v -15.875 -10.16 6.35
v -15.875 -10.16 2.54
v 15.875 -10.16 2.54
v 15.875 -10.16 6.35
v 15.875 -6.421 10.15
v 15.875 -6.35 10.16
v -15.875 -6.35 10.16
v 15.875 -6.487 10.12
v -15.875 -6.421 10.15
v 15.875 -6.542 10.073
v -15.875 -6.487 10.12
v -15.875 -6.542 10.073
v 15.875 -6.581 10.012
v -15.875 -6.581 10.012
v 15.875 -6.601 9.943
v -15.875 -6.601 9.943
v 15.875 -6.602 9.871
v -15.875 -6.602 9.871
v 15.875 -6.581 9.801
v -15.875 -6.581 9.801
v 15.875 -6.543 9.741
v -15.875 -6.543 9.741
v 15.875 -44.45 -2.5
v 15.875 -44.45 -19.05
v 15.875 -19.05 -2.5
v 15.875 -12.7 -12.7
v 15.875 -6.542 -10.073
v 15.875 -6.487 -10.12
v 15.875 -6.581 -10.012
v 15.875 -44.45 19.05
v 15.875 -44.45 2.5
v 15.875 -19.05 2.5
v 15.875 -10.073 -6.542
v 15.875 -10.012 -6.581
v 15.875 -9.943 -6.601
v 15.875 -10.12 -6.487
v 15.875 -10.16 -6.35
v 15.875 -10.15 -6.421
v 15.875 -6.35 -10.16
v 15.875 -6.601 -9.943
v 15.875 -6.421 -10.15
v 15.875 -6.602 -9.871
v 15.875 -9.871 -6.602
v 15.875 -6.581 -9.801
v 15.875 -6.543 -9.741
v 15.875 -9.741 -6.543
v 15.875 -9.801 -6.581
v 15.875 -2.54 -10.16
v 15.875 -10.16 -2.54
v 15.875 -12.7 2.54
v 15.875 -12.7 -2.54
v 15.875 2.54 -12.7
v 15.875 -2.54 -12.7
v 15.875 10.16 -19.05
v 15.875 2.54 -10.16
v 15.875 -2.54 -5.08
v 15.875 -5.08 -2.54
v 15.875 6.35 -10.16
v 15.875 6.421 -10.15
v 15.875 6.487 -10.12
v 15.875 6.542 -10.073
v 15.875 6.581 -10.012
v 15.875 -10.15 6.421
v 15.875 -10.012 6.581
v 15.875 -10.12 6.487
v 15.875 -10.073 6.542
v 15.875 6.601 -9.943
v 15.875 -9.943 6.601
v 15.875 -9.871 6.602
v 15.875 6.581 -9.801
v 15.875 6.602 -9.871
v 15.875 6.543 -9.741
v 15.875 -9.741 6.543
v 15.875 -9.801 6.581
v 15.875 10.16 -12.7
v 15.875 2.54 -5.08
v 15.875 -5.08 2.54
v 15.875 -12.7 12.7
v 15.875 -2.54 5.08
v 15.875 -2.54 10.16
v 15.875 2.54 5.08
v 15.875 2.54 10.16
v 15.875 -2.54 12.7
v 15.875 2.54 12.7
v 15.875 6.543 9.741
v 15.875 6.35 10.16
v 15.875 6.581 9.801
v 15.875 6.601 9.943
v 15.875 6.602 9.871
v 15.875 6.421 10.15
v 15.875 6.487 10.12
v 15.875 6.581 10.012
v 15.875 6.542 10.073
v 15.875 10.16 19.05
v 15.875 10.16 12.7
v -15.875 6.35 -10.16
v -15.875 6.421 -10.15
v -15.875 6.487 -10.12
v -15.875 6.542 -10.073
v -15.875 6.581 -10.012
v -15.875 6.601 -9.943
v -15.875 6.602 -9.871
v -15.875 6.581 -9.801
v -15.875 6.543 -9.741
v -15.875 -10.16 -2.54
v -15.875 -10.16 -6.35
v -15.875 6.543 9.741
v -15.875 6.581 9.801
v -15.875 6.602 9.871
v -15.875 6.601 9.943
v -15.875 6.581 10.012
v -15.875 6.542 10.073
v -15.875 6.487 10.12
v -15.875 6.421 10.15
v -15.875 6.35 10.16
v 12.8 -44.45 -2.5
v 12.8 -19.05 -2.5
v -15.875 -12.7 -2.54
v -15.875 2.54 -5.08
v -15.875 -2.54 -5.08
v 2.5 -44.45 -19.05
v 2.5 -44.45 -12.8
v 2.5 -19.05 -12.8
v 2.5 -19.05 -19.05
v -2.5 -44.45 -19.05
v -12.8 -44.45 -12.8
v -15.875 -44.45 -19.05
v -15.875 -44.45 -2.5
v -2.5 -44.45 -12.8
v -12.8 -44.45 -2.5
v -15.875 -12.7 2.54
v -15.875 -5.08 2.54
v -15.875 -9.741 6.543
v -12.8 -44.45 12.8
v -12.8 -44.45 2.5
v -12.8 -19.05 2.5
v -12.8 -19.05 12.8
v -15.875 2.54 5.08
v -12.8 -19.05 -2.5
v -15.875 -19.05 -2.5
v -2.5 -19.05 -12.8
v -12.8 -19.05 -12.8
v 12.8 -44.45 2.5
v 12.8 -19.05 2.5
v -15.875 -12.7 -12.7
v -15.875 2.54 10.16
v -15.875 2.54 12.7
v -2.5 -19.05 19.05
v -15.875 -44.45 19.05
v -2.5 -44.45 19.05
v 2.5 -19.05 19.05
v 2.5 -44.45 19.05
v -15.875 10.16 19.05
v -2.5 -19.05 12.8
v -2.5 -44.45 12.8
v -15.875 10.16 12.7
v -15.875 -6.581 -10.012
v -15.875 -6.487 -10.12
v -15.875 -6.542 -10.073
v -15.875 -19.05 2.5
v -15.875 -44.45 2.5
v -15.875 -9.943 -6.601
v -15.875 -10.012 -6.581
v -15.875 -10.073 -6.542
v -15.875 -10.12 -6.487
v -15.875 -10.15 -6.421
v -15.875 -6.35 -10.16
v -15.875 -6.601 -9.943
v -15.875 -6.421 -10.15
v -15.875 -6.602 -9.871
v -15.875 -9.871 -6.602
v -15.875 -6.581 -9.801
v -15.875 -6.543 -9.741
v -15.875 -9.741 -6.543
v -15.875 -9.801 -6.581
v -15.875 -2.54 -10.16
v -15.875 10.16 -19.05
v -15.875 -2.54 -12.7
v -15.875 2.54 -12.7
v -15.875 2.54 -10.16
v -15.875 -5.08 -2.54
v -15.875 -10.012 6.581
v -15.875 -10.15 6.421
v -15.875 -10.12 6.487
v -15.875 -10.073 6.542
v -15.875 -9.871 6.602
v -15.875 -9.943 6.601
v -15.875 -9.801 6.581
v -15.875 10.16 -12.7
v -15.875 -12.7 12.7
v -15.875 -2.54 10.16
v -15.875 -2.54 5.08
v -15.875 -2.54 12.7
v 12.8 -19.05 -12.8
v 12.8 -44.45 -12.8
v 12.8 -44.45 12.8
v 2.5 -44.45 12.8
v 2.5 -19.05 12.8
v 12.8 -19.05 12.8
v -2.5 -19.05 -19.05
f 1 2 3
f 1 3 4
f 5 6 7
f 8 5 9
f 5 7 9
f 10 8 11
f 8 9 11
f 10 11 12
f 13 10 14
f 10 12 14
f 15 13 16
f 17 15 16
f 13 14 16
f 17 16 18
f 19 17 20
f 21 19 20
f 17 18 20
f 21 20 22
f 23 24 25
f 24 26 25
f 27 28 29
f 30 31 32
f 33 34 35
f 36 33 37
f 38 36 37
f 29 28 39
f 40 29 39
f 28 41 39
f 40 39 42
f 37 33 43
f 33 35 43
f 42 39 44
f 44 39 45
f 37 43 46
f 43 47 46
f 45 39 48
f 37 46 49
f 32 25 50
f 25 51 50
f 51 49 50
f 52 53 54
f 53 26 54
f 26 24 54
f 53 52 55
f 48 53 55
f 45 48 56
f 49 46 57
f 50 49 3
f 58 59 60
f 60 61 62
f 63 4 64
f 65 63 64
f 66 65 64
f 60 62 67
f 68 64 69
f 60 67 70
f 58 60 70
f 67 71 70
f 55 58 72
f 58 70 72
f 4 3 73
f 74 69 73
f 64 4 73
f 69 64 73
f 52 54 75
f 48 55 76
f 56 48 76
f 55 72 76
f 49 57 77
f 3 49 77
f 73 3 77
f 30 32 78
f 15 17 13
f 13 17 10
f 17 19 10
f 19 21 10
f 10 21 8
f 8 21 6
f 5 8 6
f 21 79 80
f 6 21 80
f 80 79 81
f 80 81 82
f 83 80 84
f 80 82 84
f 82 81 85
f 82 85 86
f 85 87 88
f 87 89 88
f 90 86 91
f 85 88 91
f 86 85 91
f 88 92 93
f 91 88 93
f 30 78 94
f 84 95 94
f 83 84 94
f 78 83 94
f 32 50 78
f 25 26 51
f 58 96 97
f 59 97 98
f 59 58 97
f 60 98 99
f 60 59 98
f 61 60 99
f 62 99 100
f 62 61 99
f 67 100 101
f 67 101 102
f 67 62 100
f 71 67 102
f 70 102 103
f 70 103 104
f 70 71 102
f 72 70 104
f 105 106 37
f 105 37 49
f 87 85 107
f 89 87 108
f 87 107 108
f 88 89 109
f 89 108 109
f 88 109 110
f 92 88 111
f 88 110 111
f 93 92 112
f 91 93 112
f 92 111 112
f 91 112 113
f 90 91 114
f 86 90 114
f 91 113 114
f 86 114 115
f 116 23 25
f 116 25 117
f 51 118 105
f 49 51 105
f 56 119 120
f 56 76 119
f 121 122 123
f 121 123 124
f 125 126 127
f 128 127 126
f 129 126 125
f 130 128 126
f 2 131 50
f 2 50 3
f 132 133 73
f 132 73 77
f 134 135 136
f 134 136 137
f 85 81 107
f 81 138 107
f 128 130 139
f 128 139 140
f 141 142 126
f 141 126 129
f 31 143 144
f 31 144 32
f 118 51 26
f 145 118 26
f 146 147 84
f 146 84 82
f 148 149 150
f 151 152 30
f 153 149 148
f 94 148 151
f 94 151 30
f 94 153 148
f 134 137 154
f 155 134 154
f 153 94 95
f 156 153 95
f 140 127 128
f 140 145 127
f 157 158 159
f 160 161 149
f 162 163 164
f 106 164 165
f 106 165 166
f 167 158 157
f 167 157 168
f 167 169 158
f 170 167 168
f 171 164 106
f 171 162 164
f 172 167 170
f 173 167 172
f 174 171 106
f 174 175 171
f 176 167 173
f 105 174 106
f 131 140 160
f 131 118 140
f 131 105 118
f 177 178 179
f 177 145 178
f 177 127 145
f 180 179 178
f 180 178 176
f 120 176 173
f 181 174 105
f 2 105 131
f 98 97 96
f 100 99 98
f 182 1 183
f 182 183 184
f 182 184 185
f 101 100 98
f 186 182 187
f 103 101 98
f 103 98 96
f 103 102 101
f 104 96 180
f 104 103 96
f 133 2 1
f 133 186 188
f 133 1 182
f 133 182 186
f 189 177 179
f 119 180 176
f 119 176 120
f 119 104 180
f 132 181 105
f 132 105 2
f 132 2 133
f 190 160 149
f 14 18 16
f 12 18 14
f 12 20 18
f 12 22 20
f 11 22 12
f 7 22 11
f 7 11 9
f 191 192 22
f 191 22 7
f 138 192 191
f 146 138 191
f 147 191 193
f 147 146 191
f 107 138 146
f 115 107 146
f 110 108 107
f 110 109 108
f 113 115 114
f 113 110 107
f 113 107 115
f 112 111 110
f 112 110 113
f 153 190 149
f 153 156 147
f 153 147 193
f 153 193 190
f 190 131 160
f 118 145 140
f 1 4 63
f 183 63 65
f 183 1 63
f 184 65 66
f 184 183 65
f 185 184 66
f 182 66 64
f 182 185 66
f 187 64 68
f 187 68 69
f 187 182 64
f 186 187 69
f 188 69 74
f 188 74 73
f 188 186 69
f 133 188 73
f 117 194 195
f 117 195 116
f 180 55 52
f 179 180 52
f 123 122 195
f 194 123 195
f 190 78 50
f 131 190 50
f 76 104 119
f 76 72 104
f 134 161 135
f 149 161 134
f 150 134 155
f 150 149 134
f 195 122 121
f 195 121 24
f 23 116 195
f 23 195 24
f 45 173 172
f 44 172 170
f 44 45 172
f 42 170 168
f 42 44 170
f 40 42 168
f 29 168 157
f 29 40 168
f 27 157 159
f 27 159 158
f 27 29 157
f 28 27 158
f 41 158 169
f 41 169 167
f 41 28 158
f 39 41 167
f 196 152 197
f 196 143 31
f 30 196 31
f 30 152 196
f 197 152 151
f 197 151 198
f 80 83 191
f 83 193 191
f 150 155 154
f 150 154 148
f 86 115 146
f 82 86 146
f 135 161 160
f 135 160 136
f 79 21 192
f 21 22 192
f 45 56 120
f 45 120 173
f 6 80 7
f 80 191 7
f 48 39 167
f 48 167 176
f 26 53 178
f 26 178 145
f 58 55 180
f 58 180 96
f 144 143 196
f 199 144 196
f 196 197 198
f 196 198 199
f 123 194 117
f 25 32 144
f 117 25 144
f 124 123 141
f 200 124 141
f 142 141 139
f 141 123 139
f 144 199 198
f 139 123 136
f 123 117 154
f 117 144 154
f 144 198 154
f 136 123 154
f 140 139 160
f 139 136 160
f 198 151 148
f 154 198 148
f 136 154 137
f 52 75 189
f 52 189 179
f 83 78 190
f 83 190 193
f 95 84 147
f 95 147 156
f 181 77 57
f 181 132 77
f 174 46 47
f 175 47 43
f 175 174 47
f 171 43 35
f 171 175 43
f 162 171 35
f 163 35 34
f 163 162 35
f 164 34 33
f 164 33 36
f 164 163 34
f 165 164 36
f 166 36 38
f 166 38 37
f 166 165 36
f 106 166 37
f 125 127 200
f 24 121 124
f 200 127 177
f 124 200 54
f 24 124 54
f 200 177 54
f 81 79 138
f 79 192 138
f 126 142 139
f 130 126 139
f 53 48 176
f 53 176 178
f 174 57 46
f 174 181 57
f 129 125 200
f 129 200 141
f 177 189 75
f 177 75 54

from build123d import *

# Parameters (mm, degrees)
SKETCH10_W          = 2.54
SKETCH10_H          = 5.08
SKETCH10_W_2        = 5.08
SKETCH10_H_2        = 2.54
BOSS_EXTRUDE3_DEPTH = 15.875
BOSS_EXTRUDE4_DEPTH = 31.75
SKETCH12_W          = 13.97
SKETCH12_H          = 7.62
CUT_EXTRUDE1_DEPTH  = 42.639734629
SKETCH14_W          = 31.75
SKETCH14_H          = 38.1
SKETCH14_W_2        = 25.6
SKETCH14_H_2        = 25.6
BOSS_EXTRUDE5_DEPTH = 25.4
CUT_EXTRUDE2_DEPTH  = 25.4


with BuildPart() as part:
    # Sketch10 → Boss-Extrude3 (new, symmetric)
    with BuildSketch(Plane(origin=(0, 0, 0), x_dir=(0, 0, -1), z_dir=(1, 0, 0))):
        with Locations((-11.43, 0)):
            Rectangle(SKETCH10_W, SKETCH10_H)
        with BuildLine():
            Line((-5.08, 2.54), (-9.740509205, 6.542688341))
            ThreePointArc((-9.740509205, 6.542688341), (-10.012022021, 6.580814495), (-10.16, 6.35))
            Line((-10.16, 6.35), (-10.16, -6.35))
            ThreePointArc((-10.16, -6.35), (-10.012022021, -6.580814495), (-9.740509205, -6.542688341))
            Line((-9.740509205, -6.542688341), (-5.08, -2.54))
            Line((-5.08, -2.54), (-5.08, 2.54))
        make_face()
        with BuildLine():
            Line((6.35, 10.16), (-6.35, 10.16))
            ThreePointArc((-6.35, 10.16), (-6.580814495, 10.012022021), (-6.542688341, 9.740509205))
            Line((-6.542688341, 9.740509205), (-2.54, 5.08))
            Line((-2.54, 5.08), (2.54, 5.08))
            Line((2.54, 5.08), (6.542688341, 9.740509205))
            ThreePointArc((6.542688341, 9.740509205), (6.580814495, 10.012022021), (6.35, 10.16))
        make_face()
        with Locations((0, 11.43)):
            Rectangle(SKETCH10_W_2, SKETCH10_H_2)
        with BuildLine():
            ThreePointArc((6.542688341, -9.740509205), (6.580814495, -10.012022021), (6.35, -10.16))
            Line((6.35, -10.16), (-6.35, -10.16))
            ThreePointArc((-6.35, -10.16), (-6.580814495, -10.012022021), (-6.542688341, -9.740509205))
            Line((-6.542688341, -9.740509205), (-2.54, -5.08))
            Line((-2.54, -5.08), (2.54, -5.08))
            Line((2.54, -5.08), (6.542688341, -9.740509205))
        make_face()
        with Locations((0, -11.43)):
            Rectangle(SKETCH10_W_2, SKETCH10_H_2)
        with BuildLine():
            Line((5.08, 2.54), (5.08, -2.54))
            Line((5.08, -2.54), (9.740509205, -6.542688341))
            ThreePointArc((9.740509205, -6.542688341), (10.012022021, -6.580814495), (10.16, -6.35))
            Line((10.16, -6.35), (10.16, -2.54))
            Line((10.16, -2.54), (10.16, 2.54))
            Line((10.16, 2.54), (10.16, 6.35))
            ThreePointArc((10.16, 6.35), (10.012022021, 6.580814495), (9.740509205, 6.542688341))
            Line((9.740509205, 6.542688341), (5.08, 2.54))
        make_face()
        with Locations((11.43, 0)):
            Rectangle(SKETCH10_W, SKETCH10_H)
    extrude(amount=BOSS_EXTRUDE3_DEPTH, both=True)

    # Sketch11 → Boss-Extrude4 (add)
    with BuildSketch(Plane(origin=(15.875, 0, 0), x_dir=(0, 0, -1), z_dir=(1, 0, 0))):
        Polygon((-12.7, -2.54), (-12.7, -12.7), (12.7, -12.7), (12.7, -2.54), (12.7, 2.54), (12.7, 10.16), (19.05, 10.16), (19.05, -19.05), (-19.05, -19.05), (-19.05, 10.16), (-12.7, 10.16), (-12.7, 2.54), align=None)
    extrude(amount=-BOSS_EXTRUDE4_DEPTH)

    # Sketch12 → Cut-Extrude1 (cut, through all)
    with BuildSketch(Plane(origin=(15.875, 0, 0), x_dir=(0, 0, -1), z_dir=(1, 0, 0))):
        with Locations((0, 8.89)):
            Rectangle(SKETCH12_W, SKETCH12_H)
    extrude(amount=-CUT_EXTRUDE1_DEPTH, mode=Mode.SUBTRACT)

    # Sketch14 → Boss-Extrude5 (add)
    with BuildSketch(Plane.XZ.offset(19.05)):
        Rectangle(SKETCH14_W, SKETCH14_H)
        Rectangle(SKETCH14_W_2, SKETCH14_H_2, mode=Mode.SUBTRACT)
    extrude(amount=BOSS_EXTRUDE5_DEPTH)

    # Sketch15 → Cut-Extrude2 (cut)
    with BuildSketch(Plane.XZ.offset(44.45)):
        Polygon((-15.875, -2.5), (-15.875, 2.5), (-2.5, 2.5), (-2.5, 19.05), (2.5, 19.05), (2.5, 2.5), (15.875, 2.5), (15.875, -2.5), (2.5, -2.5), (2.5, -19.05), (-2.5, -19.05), (-2.5, -2.5), align=None)
    extrude(amount=-CUT_EXTRUDE2_DEPTH, mode=Mode.SUBTRACT)


solid = part.part
